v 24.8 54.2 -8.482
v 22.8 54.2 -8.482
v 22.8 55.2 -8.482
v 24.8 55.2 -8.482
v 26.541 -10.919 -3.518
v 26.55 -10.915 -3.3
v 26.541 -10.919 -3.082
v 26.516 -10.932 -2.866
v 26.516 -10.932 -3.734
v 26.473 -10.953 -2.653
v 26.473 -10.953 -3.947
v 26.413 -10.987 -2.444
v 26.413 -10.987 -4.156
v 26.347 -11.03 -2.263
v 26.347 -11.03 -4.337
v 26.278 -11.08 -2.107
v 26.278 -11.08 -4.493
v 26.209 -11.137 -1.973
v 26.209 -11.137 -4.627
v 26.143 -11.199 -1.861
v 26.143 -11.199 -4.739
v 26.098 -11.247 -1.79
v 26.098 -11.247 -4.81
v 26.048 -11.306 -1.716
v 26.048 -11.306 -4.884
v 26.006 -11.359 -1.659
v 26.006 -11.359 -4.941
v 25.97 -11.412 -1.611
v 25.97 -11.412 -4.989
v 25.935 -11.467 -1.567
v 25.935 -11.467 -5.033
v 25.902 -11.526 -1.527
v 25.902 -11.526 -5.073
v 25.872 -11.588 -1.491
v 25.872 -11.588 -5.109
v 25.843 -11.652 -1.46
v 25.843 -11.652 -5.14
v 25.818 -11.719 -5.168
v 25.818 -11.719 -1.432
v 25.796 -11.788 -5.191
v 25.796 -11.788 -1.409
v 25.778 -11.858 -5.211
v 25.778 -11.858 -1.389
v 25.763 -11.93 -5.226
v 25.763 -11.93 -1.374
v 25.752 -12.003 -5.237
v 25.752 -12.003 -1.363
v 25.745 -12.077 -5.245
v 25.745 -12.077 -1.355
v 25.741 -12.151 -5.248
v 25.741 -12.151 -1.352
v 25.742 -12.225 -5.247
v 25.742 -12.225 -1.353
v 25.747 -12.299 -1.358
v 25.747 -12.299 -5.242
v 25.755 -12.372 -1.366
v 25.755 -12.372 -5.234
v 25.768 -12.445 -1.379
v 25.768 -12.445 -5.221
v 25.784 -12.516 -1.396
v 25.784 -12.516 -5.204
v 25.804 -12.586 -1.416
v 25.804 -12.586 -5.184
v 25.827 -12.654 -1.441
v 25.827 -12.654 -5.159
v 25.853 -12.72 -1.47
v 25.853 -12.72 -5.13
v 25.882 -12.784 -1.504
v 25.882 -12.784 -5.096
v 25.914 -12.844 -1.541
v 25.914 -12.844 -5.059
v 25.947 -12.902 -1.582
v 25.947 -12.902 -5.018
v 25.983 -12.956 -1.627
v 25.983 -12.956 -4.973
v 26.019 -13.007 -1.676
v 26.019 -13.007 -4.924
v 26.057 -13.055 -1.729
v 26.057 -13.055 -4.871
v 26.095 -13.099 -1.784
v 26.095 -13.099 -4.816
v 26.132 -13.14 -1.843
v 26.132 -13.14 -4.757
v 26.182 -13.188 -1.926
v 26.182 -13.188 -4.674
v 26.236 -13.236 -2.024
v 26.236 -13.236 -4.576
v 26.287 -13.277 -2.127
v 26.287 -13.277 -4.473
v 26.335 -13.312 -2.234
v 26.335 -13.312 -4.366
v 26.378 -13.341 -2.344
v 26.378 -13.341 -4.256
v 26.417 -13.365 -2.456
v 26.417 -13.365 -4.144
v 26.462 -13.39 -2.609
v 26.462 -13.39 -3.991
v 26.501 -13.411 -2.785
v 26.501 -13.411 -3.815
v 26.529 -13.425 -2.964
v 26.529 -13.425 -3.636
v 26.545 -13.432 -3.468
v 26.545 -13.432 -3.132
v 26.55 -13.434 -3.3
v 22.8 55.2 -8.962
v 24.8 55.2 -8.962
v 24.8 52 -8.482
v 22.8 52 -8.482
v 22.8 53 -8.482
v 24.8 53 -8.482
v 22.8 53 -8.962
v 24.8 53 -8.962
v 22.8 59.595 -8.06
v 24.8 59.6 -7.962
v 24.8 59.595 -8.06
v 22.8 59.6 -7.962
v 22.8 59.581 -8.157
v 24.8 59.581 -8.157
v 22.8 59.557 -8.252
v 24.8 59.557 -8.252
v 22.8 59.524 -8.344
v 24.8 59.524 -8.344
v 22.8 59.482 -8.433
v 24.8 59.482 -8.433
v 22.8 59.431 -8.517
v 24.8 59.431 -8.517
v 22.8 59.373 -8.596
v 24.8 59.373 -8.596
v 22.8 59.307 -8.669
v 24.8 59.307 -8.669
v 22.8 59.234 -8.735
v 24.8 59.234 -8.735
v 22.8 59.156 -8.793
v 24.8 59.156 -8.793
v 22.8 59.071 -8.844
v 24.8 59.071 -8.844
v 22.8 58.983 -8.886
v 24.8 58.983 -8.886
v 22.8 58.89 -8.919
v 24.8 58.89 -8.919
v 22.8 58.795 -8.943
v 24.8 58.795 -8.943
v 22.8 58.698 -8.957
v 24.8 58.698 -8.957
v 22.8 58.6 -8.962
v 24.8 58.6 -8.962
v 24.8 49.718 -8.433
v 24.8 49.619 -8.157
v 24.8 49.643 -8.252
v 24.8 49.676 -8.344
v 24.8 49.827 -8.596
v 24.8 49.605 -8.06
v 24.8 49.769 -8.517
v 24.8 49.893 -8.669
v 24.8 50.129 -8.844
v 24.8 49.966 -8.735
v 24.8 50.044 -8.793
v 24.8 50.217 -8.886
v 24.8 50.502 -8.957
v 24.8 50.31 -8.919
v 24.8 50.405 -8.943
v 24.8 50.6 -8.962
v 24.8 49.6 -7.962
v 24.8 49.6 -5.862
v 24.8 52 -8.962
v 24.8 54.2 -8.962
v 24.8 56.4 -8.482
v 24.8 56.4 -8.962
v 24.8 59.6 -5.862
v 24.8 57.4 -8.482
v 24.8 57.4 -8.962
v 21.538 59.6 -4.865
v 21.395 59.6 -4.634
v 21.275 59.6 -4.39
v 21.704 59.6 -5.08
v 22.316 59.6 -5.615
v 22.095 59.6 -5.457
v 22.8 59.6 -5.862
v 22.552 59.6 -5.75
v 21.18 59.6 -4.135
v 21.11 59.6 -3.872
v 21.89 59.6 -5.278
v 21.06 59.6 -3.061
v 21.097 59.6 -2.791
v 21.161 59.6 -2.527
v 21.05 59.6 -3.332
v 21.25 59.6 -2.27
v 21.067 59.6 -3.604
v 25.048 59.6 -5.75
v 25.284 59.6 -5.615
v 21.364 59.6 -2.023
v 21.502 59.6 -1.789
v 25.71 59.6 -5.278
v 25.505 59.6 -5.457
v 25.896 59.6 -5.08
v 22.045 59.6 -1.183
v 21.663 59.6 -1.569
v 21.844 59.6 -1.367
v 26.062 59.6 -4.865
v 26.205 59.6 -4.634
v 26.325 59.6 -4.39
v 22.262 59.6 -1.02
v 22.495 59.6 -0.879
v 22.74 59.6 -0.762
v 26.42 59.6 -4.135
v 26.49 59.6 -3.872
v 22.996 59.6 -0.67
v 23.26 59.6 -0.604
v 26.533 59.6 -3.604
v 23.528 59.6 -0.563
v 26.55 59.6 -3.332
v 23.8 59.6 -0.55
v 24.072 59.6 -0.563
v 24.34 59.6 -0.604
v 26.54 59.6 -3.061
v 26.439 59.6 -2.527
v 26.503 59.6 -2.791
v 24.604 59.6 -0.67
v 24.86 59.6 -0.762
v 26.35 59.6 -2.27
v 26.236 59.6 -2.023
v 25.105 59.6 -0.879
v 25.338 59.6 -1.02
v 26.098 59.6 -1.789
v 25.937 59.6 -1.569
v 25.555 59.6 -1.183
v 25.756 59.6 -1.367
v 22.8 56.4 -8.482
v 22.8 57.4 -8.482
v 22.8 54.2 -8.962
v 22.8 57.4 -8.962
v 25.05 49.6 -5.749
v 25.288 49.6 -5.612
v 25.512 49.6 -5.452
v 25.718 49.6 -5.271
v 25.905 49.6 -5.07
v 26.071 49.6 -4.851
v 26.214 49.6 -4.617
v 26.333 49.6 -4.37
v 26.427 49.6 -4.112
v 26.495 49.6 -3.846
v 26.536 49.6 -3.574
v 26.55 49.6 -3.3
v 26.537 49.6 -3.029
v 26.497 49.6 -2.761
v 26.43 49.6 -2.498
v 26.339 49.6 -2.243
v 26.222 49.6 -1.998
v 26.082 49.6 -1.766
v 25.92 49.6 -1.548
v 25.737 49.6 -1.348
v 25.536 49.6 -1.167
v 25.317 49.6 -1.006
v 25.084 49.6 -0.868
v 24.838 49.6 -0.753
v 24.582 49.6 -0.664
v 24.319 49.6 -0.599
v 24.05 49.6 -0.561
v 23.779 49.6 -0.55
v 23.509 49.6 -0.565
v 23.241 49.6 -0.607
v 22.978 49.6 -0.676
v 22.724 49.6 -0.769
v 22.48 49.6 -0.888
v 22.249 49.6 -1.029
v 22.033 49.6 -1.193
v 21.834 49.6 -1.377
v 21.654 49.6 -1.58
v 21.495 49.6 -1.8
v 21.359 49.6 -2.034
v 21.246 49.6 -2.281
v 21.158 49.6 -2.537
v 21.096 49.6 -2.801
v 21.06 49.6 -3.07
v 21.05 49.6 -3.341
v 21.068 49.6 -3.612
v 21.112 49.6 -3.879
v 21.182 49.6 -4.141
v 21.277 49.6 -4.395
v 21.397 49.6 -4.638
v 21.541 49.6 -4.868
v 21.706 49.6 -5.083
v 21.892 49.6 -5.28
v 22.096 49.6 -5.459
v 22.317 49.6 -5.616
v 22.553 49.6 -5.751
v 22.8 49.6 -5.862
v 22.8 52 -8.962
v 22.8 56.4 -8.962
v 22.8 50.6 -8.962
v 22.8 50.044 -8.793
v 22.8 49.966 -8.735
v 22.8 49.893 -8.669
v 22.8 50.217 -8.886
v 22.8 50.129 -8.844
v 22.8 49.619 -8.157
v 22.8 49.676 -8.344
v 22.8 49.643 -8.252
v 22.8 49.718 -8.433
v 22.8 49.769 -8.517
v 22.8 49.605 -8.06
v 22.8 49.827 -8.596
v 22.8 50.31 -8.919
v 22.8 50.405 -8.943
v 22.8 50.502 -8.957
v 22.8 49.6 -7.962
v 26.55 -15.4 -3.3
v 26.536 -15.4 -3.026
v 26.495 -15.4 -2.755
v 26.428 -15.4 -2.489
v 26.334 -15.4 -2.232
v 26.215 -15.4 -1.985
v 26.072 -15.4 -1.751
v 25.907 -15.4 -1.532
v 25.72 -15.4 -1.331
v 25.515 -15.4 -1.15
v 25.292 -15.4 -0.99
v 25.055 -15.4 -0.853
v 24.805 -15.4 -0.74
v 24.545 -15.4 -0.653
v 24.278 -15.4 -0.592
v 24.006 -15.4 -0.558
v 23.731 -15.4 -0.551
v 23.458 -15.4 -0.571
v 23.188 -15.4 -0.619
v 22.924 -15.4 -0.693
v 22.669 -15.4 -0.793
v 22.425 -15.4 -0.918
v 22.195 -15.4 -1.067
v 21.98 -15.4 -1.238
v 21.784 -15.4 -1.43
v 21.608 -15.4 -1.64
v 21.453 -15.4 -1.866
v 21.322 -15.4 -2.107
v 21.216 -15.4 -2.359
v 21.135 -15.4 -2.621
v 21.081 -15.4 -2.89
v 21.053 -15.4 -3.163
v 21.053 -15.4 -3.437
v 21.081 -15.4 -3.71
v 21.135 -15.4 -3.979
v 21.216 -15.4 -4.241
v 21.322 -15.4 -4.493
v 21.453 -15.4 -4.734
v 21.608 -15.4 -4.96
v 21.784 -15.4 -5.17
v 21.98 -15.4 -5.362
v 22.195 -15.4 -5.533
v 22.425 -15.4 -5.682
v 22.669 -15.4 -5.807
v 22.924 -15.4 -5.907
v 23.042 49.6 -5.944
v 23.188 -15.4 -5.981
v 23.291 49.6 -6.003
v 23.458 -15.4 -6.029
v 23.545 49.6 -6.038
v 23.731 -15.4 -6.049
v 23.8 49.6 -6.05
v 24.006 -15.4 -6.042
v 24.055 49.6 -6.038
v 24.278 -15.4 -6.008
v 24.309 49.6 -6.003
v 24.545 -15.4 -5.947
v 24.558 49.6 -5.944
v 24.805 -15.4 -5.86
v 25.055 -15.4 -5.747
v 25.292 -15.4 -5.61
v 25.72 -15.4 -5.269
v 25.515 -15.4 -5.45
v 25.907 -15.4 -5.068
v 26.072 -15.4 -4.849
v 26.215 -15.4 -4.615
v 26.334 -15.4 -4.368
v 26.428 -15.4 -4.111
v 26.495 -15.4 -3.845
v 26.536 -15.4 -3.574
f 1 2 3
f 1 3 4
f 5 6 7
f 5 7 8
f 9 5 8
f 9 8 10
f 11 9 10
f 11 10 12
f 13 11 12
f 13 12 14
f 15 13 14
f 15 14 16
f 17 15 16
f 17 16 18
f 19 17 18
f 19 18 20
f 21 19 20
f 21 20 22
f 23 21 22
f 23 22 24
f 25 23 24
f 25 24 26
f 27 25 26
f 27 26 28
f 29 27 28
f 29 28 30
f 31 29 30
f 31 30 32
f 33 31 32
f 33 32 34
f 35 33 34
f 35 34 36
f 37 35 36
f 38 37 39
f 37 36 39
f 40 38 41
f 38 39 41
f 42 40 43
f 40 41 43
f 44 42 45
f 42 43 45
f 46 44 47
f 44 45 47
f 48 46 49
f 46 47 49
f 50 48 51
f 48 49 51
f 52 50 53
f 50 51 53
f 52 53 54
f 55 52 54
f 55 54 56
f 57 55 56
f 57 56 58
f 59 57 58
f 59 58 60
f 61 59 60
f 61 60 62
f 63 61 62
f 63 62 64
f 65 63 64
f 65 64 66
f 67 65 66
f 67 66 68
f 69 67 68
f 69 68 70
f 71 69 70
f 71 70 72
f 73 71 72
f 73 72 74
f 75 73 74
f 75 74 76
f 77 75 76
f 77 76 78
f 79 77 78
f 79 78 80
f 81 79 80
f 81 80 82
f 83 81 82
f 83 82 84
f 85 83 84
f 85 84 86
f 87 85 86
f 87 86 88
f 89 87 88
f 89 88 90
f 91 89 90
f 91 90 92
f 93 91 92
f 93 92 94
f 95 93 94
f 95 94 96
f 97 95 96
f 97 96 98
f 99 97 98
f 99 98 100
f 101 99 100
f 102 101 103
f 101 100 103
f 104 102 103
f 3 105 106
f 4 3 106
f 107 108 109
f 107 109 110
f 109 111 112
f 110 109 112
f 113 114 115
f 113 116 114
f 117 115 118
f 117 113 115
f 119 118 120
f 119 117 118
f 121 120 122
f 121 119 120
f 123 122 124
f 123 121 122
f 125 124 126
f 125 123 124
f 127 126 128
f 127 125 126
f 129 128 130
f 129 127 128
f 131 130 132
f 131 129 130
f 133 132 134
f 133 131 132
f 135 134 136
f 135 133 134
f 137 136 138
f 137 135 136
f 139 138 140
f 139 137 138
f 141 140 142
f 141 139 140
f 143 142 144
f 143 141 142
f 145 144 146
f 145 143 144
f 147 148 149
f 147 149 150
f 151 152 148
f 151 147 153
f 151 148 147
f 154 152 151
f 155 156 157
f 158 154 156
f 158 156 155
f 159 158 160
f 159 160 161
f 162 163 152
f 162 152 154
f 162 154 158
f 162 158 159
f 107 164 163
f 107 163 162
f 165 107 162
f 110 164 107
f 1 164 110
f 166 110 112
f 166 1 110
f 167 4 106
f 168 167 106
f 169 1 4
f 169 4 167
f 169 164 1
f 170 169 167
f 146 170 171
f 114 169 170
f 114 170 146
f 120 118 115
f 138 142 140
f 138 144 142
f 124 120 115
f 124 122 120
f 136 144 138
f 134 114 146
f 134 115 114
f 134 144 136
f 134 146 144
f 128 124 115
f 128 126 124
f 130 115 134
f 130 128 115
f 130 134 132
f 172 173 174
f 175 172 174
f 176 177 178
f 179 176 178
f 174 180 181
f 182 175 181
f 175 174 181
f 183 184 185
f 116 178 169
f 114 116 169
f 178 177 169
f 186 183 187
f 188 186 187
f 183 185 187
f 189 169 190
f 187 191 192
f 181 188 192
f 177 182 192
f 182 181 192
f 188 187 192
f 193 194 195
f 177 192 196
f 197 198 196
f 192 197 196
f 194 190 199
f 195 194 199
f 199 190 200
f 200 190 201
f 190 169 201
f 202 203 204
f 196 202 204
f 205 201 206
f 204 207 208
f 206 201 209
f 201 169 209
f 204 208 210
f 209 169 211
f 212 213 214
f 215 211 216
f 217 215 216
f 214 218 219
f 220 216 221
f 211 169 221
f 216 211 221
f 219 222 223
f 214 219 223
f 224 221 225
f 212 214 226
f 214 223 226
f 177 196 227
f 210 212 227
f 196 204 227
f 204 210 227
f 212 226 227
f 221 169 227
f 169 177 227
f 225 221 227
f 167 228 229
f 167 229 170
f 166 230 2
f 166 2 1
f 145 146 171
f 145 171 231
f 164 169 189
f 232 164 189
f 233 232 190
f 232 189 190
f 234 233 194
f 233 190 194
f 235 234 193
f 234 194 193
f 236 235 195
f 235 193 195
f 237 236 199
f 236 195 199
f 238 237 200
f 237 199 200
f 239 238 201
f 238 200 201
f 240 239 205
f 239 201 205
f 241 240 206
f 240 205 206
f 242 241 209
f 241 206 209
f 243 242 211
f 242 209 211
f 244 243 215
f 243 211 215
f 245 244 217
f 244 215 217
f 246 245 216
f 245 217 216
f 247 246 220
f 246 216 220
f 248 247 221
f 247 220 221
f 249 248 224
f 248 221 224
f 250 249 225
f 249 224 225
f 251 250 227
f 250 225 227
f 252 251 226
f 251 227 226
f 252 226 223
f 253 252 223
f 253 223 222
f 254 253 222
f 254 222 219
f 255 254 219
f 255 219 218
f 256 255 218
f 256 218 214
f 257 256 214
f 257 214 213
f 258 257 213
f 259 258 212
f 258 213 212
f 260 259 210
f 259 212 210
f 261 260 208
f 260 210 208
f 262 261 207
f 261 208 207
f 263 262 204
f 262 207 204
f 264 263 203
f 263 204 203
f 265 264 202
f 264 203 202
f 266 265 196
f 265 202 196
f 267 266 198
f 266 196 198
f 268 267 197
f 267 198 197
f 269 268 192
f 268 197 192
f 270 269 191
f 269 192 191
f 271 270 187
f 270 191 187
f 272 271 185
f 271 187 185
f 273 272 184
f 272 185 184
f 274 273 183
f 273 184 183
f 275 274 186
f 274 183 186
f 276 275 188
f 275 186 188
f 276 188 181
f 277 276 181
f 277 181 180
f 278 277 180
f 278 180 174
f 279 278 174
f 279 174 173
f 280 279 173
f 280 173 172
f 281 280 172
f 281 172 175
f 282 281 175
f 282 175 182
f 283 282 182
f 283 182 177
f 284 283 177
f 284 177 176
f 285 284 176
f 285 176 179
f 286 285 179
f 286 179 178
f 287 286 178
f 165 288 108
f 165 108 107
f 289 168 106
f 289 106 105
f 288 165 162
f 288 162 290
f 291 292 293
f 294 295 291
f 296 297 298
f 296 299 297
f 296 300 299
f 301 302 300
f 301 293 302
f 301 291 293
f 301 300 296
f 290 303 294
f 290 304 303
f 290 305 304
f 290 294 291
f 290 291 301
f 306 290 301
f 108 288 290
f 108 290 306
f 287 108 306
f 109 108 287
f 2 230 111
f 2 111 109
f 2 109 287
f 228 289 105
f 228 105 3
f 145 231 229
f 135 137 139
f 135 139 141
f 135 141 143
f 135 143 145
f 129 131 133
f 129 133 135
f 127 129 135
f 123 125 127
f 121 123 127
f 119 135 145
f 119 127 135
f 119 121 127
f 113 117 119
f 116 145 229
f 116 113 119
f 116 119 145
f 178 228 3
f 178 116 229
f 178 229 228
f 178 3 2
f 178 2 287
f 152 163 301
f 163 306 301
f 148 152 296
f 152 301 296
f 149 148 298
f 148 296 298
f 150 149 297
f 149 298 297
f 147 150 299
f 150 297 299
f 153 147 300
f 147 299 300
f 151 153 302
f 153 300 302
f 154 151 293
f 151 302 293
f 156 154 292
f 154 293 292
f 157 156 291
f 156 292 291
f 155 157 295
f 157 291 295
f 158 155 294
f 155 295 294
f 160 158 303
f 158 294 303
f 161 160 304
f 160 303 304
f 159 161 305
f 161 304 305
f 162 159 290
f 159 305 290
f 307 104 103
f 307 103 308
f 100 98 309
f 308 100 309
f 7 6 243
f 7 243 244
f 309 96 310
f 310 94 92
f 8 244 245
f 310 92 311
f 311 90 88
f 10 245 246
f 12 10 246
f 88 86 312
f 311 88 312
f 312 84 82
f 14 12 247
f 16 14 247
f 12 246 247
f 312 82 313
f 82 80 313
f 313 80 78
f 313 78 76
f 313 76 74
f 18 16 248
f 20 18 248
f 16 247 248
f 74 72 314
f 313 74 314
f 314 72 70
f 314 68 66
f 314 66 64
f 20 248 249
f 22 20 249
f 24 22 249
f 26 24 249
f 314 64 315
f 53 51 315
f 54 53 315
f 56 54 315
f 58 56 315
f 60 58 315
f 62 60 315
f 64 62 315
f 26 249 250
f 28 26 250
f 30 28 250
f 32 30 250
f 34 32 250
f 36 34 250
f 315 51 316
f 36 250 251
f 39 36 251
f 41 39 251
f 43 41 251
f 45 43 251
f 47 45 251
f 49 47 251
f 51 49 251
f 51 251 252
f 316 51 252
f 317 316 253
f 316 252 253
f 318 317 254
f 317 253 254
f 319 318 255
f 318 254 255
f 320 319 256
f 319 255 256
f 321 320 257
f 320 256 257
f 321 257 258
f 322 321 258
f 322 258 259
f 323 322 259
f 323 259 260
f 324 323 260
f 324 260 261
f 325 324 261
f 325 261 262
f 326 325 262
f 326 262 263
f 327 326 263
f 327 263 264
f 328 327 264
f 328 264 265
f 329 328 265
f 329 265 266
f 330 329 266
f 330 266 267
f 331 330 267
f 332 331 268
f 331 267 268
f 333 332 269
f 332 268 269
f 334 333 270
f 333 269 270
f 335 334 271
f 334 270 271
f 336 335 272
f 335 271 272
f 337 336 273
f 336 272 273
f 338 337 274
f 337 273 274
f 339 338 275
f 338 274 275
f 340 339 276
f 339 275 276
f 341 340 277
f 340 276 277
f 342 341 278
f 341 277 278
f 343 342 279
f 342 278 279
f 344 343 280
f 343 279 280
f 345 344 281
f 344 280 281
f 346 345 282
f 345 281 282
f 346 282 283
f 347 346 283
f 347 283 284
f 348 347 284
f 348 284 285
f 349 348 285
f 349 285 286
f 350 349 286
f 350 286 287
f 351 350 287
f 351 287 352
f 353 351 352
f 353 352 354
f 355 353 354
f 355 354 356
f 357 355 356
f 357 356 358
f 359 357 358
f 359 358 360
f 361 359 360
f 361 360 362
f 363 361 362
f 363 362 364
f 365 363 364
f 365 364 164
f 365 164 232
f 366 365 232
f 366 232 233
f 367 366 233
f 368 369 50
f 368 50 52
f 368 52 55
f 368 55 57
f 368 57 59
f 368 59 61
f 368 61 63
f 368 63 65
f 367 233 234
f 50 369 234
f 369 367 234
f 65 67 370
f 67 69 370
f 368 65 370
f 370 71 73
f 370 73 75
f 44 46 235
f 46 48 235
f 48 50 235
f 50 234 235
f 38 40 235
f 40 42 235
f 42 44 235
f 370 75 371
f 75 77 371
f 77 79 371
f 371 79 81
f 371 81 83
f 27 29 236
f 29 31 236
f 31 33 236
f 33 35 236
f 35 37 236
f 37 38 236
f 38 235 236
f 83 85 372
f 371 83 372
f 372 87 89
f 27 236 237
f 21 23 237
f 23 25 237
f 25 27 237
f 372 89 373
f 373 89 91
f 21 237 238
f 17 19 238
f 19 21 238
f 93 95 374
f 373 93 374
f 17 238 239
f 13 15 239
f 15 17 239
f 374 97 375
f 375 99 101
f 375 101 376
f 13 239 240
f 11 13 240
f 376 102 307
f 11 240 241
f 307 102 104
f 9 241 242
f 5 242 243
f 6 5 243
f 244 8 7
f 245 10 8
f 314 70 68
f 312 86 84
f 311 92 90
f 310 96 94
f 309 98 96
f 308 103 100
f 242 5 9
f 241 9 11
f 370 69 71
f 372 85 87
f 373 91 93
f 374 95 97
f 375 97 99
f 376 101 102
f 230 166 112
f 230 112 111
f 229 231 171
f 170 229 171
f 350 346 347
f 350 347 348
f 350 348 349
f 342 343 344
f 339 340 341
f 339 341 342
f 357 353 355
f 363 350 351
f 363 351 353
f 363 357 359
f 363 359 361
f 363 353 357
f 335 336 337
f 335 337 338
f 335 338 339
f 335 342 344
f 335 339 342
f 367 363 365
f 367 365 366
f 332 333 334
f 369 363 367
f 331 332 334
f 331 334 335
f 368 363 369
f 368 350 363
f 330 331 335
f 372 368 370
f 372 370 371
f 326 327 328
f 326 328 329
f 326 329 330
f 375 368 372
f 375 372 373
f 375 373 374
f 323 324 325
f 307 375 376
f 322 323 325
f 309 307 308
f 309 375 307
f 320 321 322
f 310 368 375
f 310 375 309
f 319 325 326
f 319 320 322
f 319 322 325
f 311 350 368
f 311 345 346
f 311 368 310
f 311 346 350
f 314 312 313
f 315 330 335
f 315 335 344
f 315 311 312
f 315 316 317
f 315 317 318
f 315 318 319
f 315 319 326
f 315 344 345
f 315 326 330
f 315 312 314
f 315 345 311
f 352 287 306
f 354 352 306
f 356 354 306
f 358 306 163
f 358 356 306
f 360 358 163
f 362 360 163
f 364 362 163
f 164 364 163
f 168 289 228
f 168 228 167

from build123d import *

# Parameters (mm, degrees)
PAD003_DEPTH    = 10
SKETCH021_R     = 2.75
PAD009_DEPTH    = 65
SKETCH022_R     = 1.385036
POCKET011_DEPTH = 9
SKETCH043_W     = 2.1
SKETCH043_H     = 1
POCKET021_DEPTH = 0.48
FILLET007_R     = 1


with BuildPart() as part:
    # Sketch007 → Pad003 (new body)
    with BuildSketch(Plane(origin=(-20, 60, -6), x_dir=(1, 0, 0), z_dir=(0, -1, 0))):
        with BuildLine():
            ThreePointArc((44.8, 1.638262), (43.8, 6.95), (42.8, 1.638262))
            Line((42.8, -1.461738), (42.8, 1.638262))
            Line((44.8, -1.461738), (42.8, -1.461738))
            Line((44.8, 1.638262), (44.8, -1.461738))
        make_face()
    extrude(amount=PAD003_DEPTH)

    # Sketch021 (on Face6 of Pad003) → Pad009 (join)
    with BuildSketch(Plane.XZ.offset(-50)):
        with Locations((23.8, -1.8)):
            Circle(SKETCH021_R)
    extrude(amount=PAD009_DEPTH)

    # Sketch022 → Pocket011 (cut)
    with BuildSketch(Plane.XY.offset(2)):
        with Locations((27.12612, -11.774689)):
            Circle(SKETCH022_R)
    extrude(amount=-POCKET011_DEPTH, mode=Mode.SUBTRACT)

    # Sketch043 (on Face6 of Pocket011) → Pocket021 (cut)
    with BuildSketch(Plane(origin=(0, 0, -7.461738), x_dir=(1, 0, 0), z_dir=(0, 0, -1))):
        with Locations((23.804798, -57.3)):
            Rectangle(SKETCH043_W, SKETCH043_H)
        with Locations((23.804798, -52.9)):
            Rectangle(SKETCH043_W, SKETCH043_H)
        with Locations((23.804798, -55.1)):
            Rectangle(SKETCH043_W, SKETCH043_H)
    extrude(amount=-POCKET021_DEPTH, mode=Mode.SUBTRACT)

    # Fillet007
    fillet007_edges = [part.edges().sort_by_distance(p)[0] for p in [
        (23.8, 60, -7.461738),
        (23.8, 50, -7.461738),
    ]]
    fillet(fillet007_edges, radius=FILLET007_R)


with BuildPart() as part_1:
    # Body002 placement: moved
    add(part.part.moved(Location((0, -0.4, -1.5))))


solid = part_1.part
